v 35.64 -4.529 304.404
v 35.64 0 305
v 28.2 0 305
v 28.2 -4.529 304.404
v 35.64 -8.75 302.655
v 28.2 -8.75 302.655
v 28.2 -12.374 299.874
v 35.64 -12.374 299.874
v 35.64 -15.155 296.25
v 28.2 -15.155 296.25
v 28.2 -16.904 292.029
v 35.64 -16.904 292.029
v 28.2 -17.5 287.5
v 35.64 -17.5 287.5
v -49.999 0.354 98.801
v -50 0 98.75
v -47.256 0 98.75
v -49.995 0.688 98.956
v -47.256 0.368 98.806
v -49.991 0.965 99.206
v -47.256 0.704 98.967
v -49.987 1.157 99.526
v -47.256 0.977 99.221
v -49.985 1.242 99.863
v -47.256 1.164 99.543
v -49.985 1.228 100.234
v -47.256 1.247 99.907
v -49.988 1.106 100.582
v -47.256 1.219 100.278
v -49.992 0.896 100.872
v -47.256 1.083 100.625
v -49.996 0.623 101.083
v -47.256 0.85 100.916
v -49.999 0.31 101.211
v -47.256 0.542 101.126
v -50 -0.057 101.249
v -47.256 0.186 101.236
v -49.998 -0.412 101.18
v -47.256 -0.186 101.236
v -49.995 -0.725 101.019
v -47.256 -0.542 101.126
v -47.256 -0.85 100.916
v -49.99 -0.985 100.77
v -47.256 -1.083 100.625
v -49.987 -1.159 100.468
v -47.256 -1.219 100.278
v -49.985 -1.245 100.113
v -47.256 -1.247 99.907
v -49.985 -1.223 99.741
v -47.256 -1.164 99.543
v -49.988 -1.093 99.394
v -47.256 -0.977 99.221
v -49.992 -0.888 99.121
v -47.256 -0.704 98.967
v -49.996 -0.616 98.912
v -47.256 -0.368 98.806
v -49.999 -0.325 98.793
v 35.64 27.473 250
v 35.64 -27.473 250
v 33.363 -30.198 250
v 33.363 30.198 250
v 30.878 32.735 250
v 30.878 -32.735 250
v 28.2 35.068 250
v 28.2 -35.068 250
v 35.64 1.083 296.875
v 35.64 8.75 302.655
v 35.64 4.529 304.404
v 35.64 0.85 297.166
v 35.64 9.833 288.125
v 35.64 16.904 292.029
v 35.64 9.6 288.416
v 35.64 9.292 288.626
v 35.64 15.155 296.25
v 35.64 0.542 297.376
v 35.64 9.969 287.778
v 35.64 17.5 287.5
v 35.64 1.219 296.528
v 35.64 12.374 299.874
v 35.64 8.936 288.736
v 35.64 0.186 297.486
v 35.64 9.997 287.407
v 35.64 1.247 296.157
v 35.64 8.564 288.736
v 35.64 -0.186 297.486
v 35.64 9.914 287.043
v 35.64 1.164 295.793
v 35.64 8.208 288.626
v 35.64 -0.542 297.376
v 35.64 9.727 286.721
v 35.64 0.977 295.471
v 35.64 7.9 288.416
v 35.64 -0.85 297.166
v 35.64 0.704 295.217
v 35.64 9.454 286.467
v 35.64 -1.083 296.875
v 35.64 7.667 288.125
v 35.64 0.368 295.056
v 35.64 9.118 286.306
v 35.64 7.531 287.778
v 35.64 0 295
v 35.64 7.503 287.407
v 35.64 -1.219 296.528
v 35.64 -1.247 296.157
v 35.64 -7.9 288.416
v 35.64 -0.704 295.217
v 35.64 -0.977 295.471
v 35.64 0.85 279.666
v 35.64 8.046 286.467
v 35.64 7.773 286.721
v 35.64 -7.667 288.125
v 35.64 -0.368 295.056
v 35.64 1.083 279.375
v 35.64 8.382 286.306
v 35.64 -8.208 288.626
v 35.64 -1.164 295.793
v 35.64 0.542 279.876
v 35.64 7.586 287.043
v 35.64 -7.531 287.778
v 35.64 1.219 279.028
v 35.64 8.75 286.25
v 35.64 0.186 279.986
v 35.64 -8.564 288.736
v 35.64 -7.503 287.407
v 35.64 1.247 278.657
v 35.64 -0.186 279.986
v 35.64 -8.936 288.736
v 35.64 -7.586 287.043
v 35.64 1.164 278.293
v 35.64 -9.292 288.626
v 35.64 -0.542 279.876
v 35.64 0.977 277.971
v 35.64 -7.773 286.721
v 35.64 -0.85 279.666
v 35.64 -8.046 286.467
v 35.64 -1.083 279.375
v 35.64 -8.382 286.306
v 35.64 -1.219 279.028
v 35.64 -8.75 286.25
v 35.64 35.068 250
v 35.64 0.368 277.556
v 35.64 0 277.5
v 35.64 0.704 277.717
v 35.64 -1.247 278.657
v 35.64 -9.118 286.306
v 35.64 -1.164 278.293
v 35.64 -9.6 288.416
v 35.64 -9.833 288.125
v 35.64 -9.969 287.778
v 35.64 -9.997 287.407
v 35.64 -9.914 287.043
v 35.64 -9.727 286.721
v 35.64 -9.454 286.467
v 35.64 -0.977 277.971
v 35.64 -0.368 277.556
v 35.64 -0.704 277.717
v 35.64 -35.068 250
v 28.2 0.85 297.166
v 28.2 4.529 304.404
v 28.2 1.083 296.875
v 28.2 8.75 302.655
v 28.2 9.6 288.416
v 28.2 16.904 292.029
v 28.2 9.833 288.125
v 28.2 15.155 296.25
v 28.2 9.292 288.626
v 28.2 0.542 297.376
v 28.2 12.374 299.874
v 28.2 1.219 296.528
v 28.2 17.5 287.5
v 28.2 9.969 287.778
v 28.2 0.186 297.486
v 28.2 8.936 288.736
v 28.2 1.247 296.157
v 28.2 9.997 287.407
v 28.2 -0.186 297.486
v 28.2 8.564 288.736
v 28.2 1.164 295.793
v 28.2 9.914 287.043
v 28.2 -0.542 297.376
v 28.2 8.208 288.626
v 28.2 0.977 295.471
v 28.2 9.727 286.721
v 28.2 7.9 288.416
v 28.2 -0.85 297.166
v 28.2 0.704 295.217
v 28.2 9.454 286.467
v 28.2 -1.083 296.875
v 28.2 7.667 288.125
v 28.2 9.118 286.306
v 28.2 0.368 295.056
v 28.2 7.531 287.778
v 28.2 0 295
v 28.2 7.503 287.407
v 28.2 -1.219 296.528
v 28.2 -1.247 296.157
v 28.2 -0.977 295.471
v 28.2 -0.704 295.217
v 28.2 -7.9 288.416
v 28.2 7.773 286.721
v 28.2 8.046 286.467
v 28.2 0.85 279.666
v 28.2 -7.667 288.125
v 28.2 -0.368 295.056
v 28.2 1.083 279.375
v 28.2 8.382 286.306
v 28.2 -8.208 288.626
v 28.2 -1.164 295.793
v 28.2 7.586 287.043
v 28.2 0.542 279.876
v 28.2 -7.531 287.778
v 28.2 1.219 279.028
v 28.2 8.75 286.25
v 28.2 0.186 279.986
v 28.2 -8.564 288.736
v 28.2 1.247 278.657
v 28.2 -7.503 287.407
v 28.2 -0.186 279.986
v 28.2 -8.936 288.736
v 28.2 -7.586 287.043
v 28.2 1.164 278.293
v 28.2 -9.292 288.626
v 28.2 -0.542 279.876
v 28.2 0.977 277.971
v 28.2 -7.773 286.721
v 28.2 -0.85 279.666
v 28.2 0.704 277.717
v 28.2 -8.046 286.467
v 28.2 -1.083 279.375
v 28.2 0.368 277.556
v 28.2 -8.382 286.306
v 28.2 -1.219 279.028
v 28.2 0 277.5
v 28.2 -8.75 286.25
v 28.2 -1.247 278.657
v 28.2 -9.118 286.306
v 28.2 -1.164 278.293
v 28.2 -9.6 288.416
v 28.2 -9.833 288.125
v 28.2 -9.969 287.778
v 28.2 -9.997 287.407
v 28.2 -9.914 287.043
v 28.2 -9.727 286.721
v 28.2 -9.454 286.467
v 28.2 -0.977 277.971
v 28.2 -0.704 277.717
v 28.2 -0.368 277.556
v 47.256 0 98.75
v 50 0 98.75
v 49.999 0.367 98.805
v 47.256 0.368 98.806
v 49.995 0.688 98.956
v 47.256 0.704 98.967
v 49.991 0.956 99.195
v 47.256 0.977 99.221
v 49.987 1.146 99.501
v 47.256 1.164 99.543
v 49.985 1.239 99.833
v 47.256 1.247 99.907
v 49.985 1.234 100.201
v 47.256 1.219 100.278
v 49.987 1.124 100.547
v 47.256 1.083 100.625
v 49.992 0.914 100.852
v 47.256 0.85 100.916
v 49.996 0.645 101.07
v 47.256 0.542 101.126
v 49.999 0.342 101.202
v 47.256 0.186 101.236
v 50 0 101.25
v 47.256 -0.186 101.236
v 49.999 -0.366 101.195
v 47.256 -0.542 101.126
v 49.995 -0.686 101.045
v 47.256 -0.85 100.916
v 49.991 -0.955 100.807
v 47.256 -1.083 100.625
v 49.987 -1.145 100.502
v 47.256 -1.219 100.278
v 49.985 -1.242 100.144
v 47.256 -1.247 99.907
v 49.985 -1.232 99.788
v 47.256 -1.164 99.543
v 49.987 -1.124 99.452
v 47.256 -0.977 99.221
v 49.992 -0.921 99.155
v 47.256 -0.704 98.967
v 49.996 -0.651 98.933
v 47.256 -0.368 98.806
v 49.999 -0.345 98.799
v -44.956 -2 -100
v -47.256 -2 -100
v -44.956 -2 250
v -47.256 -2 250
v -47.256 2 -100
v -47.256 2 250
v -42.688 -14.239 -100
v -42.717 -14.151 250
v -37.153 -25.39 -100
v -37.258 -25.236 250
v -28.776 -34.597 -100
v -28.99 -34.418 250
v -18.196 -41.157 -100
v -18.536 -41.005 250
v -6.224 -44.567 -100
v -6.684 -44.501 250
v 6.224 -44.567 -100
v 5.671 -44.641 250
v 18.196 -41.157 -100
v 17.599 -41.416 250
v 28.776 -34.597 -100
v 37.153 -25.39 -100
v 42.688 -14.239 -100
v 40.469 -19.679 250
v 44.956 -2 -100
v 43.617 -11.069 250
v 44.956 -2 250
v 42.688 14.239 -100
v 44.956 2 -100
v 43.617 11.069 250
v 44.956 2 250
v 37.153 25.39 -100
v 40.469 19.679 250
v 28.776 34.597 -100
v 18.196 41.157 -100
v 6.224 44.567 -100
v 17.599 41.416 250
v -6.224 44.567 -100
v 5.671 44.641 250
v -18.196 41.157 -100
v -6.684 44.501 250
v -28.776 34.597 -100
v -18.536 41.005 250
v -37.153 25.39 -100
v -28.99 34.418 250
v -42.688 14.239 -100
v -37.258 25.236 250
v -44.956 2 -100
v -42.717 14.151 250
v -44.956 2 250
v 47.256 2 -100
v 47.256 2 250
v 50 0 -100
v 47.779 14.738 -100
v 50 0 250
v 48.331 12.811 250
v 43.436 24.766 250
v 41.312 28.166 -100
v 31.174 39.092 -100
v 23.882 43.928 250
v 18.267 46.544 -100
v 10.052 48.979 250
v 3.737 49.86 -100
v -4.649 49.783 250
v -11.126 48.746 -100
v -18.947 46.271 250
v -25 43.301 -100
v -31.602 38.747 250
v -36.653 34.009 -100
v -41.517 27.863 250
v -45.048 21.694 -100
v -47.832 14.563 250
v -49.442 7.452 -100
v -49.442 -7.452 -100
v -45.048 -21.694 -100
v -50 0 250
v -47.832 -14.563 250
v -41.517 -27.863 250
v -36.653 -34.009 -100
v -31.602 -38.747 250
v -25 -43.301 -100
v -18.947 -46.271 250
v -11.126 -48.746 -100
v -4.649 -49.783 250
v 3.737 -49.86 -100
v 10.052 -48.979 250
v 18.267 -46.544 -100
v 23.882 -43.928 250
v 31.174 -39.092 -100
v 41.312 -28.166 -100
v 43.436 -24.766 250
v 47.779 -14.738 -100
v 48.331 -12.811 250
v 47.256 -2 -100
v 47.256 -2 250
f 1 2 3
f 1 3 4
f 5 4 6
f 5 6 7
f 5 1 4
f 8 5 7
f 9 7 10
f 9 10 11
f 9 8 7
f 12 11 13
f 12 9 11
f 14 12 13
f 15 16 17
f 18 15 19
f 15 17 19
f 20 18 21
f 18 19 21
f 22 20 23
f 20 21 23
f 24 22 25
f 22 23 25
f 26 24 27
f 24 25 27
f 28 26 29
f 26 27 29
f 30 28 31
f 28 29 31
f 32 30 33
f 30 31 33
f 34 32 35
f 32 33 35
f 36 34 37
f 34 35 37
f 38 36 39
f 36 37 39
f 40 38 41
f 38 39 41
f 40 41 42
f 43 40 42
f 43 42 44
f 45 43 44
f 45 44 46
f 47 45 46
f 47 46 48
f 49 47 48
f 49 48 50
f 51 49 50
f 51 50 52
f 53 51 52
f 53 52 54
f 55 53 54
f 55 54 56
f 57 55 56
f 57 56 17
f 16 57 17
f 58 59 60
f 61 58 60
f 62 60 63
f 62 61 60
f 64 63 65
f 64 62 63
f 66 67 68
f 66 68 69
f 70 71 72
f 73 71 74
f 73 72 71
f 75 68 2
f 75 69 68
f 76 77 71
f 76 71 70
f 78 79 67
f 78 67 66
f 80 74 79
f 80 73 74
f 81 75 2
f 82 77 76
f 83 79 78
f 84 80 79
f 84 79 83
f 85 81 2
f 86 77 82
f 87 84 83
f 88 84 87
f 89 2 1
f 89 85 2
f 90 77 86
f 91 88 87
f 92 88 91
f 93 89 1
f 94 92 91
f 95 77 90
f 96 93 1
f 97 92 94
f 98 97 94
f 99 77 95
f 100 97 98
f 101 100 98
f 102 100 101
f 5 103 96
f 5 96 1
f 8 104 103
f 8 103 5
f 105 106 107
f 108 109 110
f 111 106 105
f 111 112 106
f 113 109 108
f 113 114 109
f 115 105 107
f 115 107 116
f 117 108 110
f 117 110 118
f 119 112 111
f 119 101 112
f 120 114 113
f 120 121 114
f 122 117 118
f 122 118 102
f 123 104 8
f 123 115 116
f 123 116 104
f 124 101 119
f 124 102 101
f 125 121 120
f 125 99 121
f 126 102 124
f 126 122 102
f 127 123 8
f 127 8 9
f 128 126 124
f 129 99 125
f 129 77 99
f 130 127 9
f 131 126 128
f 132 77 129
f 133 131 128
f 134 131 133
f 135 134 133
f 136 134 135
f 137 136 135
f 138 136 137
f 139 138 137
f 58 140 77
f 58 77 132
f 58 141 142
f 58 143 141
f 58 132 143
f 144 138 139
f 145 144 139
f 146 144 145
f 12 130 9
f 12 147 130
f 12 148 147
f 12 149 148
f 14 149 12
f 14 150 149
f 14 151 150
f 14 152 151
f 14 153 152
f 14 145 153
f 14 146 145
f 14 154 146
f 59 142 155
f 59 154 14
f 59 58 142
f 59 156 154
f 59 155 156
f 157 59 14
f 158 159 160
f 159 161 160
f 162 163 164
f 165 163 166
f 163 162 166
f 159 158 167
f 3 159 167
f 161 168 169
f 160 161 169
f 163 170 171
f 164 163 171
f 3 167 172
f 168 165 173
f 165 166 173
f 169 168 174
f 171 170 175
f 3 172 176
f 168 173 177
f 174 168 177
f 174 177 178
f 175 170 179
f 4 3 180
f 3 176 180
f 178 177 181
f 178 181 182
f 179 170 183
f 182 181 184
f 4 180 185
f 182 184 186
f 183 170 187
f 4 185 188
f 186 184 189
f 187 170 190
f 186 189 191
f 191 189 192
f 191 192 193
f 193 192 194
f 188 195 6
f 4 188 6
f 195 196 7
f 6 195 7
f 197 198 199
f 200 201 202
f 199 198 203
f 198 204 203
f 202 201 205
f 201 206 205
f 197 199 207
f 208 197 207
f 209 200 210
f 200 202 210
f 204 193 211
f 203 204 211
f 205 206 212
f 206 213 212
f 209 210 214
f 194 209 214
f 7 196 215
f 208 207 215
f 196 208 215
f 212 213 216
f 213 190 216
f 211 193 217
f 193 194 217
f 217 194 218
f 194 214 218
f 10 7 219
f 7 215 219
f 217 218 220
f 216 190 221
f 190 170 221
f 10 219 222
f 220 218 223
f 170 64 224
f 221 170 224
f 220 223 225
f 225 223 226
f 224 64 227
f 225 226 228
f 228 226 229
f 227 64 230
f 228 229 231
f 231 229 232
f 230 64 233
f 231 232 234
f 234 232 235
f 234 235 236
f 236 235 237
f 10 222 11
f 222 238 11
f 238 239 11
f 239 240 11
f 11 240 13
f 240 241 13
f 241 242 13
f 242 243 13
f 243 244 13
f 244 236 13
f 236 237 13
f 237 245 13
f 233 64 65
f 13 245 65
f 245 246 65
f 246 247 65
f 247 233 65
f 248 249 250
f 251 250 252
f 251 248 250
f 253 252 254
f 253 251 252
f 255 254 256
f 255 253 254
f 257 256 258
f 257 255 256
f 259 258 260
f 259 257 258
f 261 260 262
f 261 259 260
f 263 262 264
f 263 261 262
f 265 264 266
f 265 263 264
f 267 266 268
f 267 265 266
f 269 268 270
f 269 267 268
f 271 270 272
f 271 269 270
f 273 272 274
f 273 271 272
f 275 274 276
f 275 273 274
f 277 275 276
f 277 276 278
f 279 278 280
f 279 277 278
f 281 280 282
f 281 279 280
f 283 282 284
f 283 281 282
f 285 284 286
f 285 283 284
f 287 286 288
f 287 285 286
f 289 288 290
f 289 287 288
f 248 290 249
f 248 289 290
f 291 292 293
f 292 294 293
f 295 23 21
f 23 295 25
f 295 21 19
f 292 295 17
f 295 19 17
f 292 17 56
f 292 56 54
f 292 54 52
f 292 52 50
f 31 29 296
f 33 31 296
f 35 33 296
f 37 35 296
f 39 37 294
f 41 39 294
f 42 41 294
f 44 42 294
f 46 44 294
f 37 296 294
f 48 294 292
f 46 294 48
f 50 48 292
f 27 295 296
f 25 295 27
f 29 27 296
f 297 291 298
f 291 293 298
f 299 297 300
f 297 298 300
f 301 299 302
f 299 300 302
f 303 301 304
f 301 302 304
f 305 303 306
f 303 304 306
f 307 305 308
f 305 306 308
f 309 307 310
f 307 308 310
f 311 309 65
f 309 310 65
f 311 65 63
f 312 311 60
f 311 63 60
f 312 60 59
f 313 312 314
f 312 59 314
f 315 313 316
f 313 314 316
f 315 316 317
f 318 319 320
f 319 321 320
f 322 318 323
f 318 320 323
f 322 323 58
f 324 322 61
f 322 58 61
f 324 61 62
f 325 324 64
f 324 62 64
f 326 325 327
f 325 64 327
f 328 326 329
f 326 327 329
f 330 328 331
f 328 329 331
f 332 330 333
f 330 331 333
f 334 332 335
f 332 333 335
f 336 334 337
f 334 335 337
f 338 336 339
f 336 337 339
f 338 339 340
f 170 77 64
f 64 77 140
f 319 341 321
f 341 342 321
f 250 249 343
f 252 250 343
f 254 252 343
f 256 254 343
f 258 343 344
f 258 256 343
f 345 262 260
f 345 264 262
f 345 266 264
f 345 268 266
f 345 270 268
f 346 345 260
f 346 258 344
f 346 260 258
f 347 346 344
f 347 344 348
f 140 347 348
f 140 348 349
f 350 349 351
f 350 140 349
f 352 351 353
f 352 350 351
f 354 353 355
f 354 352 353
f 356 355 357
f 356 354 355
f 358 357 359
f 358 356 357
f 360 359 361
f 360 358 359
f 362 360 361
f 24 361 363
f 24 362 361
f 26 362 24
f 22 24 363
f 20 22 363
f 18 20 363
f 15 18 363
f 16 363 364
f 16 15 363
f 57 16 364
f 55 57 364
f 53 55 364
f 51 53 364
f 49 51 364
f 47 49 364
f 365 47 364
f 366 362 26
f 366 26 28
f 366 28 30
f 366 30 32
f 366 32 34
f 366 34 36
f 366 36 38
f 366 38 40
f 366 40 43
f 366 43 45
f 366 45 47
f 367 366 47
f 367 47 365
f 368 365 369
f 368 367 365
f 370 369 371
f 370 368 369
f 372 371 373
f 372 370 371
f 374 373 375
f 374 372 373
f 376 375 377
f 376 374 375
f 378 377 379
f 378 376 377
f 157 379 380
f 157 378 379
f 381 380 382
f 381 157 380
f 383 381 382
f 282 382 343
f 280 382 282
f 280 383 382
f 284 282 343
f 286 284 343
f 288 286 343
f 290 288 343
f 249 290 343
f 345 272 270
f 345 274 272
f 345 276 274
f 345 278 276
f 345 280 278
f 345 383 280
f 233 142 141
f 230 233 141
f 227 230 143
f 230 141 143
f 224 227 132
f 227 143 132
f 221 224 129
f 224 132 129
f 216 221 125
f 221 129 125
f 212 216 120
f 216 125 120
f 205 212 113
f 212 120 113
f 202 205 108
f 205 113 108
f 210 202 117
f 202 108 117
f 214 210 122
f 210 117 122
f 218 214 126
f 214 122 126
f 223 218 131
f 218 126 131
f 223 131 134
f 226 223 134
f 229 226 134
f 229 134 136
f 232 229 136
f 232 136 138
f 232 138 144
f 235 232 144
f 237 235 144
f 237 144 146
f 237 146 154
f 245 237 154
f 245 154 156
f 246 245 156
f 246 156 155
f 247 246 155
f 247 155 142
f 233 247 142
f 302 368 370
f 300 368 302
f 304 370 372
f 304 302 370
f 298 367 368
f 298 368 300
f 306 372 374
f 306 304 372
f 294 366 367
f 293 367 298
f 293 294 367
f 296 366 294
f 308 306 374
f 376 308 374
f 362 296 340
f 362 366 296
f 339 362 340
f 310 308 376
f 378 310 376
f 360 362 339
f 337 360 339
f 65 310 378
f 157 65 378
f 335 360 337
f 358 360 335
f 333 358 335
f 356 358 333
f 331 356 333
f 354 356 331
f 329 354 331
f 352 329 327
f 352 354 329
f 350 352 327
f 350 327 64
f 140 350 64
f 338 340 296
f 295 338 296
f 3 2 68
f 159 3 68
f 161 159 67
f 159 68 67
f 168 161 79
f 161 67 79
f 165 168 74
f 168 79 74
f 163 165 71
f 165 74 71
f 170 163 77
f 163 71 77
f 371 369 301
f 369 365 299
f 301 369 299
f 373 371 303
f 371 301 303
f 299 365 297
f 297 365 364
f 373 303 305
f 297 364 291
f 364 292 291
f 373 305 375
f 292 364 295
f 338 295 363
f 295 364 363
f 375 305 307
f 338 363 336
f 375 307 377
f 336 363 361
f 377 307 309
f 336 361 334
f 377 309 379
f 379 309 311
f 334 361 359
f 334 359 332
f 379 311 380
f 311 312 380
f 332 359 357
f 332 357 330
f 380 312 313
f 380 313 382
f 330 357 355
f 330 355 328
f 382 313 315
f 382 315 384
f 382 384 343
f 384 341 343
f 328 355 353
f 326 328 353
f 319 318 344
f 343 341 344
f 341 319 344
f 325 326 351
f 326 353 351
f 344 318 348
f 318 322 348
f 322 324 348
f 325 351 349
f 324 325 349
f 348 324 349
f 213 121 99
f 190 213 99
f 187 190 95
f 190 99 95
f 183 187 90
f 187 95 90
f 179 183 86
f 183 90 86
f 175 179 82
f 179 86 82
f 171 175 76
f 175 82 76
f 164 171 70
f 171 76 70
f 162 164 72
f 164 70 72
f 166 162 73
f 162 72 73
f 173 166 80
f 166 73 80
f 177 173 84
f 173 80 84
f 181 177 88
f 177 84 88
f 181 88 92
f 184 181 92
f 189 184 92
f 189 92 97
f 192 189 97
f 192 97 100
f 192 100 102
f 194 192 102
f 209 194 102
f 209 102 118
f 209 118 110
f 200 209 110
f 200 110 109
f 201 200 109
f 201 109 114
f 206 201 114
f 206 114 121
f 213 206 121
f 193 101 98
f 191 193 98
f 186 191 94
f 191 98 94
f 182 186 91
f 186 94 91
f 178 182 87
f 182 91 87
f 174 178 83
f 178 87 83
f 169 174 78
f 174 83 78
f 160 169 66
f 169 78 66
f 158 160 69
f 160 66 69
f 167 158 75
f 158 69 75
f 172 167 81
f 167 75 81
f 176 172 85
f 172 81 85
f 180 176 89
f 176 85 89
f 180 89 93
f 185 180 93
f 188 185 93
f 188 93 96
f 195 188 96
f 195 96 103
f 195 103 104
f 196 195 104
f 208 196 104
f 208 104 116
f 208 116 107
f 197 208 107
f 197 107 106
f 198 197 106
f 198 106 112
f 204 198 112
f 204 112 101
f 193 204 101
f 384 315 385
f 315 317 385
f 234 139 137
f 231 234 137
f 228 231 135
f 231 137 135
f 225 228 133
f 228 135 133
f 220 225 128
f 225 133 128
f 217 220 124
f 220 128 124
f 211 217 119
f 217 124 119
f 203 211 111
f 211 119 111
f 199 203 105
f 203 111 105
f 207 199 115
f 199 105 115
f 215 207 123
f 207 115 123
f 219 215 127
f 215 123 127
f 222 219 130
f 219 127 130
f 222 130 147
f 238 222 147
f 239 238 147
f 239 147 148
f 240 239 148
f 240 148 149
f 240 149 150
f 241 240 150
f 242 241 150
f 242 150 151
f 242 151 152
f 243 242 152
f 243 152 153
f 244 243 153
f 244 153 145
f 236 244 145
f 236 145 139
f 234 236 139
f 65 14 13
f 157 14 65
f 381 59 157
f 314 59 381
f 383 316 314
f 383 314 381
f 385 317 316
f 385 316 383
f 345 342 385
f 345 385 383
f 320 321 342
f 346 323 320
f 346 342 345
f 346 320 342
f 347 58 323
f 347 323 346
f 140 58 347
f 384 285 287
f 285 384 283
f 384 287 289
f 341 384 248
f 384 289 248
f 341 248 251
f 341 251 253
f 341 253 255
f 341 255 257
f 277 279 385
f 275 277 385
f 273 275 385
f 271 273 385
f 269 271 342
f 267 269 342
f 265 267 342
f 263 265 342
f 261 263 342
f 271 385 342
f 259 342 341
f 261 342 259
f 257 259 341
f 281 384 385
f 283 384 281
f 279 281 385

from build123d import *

# Parameters (mm, degrees)
SKETCH1_R                = 50
BOSS_EXTRUDE1_DEPTH      = 250
BOSS_EXTRUDE1_DEPTH_BACK = 100
BOSS_EXTRUDE2_DEPTH      = 55
SKETCH7_R                = 1.25
CUT_EXTRUDE4_DEPTH       = 75
CUT_EXTRUDE4_DEPTH_BACK  = 96
CUT_EXTRUDE5_DEPTH       = 96
CUT_EXTRUDE6_DEPTH       = 96
SKETCH10_R               = 1.25
CUT_EXTRUDE7_DEPTH       = 96


with BuildPart() as part:
    # Sketch1 → Boss-Extrude1 (new body, two sides)
    with BuildSketch(Plane.XY) as boss_extrude1_sk:
        Circle(SKETCH1_R)
        with BuildLine():
            Line((-44.955555556, 1.999506112), (-47.255555556, 1.999506112))
            Line((-47.255555556, 1.999506112), (-47.255555556, -1.999506112))
            Line((-47.255555556, -1.999506112), (-44.955555556, -1.999506112))
            ThreePointArc((-44.955555556, -1.999506112), (0, -45), (44.955555556, -1.999506112))
            Line((44.955555556, -1.999506112), (47.255555556, -1.999506112))
            Line((47.255555556, -1.999506112), (47.255555556, 1.999506112))
            Line((47.255555556, 1.999506112), (44.955555556, 1.999506112))
            ThreePointArc((44.955555556, 1.999506112), (0, 45), (-44.955555556, 1.999506112))
        make_face(mode=Mode.SUBTRACT)
    extrude(amount=BOSS_EXTRUDE1_DEPTH)
    extrude(boss_extrude1_sk.sketch, amount=-BOSS_EXTRUDE1_DEPTH_BACK)

    # Sketch3 → Boss-Extrude2 (add)
    with BuildSketch(Plane.XY.offset(250)):
        Polygon((28.2, 0), (28.2, 35.067934071), (35.640426485, 35.067934071), (35.640426485, -35.067934071), (28.2, -35.067934071), align=None)
    extrude(amount=BOSS_EXTRUDE2_DEPTH)

    # Sketch7 → Cut-Extrude4 (cut, two sides)
    with BuildSketch(Plane(origin=(35.640426485, 0, 0), x_dir=(0, 0, -1), z_dir=(1, 0, 0))) as cut_extrude4_sk:
        with Locations((-100, 0)):
            Circle(SKETCH7_R)
    extrude(amount=CUT_EXTRUDE4_DEPTH, mode=Mode.SUBTRACT)
    extrude(cut_extrude4_sk.sketch, amount=-CUT_EXTRUDE4_DEPTH_BACK, mode=Mode.SUBTRACT)

    # Sketch8 → Cut-Extrude5 (cut)
    with BuildSketch(Plane(origin=(35.640426485, 0, 0), x_dir=(0, 0, -1), z_dir=(1, 0, 0))):
        with BuildLine():
            Line((-287.5, 17.5), (-250, 35.067934071))
            Line((-250, 35.067934071), (-305, 35.067934071))
            Line((-305, 35.067934071), (-305, 0))
            ThreePointArc((-305, 0), (-299.874368671, 12.374368671), (-287.5, 17.5))
        make_face()
    extrude(amount=-CUT_EXTRUDE5_DEPTH, mode=Mode.SUBTRACT)

    # Sketch9 → Cut-Extrude6 (cut)
    with BuildSketch(Plane(origin=(35.640426485, 0, 0), x_dir=(0, 0, -1), z_dir=(1, 0, 0))):
        with BuildLine():
            Line((-287.5, -17.5), (-250, -35.067934071))
            Line((-250, -35.067934071), (-305, -35.067934071))
            Line((-305, -35.067934071), (-305, 0))
            ThreePointArc((-305, 0), (-299.874368671, -12.374368671), (-287.5, -17.5))
        make_face()
    extrude(amount=-CUT_EXTRUDE6_DEPTH, mode=Mode.SUBTRACT)

    # Sketch10 → Cut-Extrude7 (cut)
    with BuildSketch(Plane(origin=(35.640426485, 0, 0), x_dir=(0, 0, -1), z_dir=(1, 0, 0))):
        with Locations((-296.25, 0)):
            Circle(SKETCH10_R)
        with Locations((-287.5, 8.75)):
            Circle(SKETCH10_R)
        with Locations((-278.75, 0)):
            Circle(SKETCH10_R)
        with Locations((-287.5, -8.75)):
            Circle(SKETCH10_R)
    extrude(amount=-CUT_EXTRUDE7_DEPTH, mode=Mode.SUBTRACT)


solid = part.part
